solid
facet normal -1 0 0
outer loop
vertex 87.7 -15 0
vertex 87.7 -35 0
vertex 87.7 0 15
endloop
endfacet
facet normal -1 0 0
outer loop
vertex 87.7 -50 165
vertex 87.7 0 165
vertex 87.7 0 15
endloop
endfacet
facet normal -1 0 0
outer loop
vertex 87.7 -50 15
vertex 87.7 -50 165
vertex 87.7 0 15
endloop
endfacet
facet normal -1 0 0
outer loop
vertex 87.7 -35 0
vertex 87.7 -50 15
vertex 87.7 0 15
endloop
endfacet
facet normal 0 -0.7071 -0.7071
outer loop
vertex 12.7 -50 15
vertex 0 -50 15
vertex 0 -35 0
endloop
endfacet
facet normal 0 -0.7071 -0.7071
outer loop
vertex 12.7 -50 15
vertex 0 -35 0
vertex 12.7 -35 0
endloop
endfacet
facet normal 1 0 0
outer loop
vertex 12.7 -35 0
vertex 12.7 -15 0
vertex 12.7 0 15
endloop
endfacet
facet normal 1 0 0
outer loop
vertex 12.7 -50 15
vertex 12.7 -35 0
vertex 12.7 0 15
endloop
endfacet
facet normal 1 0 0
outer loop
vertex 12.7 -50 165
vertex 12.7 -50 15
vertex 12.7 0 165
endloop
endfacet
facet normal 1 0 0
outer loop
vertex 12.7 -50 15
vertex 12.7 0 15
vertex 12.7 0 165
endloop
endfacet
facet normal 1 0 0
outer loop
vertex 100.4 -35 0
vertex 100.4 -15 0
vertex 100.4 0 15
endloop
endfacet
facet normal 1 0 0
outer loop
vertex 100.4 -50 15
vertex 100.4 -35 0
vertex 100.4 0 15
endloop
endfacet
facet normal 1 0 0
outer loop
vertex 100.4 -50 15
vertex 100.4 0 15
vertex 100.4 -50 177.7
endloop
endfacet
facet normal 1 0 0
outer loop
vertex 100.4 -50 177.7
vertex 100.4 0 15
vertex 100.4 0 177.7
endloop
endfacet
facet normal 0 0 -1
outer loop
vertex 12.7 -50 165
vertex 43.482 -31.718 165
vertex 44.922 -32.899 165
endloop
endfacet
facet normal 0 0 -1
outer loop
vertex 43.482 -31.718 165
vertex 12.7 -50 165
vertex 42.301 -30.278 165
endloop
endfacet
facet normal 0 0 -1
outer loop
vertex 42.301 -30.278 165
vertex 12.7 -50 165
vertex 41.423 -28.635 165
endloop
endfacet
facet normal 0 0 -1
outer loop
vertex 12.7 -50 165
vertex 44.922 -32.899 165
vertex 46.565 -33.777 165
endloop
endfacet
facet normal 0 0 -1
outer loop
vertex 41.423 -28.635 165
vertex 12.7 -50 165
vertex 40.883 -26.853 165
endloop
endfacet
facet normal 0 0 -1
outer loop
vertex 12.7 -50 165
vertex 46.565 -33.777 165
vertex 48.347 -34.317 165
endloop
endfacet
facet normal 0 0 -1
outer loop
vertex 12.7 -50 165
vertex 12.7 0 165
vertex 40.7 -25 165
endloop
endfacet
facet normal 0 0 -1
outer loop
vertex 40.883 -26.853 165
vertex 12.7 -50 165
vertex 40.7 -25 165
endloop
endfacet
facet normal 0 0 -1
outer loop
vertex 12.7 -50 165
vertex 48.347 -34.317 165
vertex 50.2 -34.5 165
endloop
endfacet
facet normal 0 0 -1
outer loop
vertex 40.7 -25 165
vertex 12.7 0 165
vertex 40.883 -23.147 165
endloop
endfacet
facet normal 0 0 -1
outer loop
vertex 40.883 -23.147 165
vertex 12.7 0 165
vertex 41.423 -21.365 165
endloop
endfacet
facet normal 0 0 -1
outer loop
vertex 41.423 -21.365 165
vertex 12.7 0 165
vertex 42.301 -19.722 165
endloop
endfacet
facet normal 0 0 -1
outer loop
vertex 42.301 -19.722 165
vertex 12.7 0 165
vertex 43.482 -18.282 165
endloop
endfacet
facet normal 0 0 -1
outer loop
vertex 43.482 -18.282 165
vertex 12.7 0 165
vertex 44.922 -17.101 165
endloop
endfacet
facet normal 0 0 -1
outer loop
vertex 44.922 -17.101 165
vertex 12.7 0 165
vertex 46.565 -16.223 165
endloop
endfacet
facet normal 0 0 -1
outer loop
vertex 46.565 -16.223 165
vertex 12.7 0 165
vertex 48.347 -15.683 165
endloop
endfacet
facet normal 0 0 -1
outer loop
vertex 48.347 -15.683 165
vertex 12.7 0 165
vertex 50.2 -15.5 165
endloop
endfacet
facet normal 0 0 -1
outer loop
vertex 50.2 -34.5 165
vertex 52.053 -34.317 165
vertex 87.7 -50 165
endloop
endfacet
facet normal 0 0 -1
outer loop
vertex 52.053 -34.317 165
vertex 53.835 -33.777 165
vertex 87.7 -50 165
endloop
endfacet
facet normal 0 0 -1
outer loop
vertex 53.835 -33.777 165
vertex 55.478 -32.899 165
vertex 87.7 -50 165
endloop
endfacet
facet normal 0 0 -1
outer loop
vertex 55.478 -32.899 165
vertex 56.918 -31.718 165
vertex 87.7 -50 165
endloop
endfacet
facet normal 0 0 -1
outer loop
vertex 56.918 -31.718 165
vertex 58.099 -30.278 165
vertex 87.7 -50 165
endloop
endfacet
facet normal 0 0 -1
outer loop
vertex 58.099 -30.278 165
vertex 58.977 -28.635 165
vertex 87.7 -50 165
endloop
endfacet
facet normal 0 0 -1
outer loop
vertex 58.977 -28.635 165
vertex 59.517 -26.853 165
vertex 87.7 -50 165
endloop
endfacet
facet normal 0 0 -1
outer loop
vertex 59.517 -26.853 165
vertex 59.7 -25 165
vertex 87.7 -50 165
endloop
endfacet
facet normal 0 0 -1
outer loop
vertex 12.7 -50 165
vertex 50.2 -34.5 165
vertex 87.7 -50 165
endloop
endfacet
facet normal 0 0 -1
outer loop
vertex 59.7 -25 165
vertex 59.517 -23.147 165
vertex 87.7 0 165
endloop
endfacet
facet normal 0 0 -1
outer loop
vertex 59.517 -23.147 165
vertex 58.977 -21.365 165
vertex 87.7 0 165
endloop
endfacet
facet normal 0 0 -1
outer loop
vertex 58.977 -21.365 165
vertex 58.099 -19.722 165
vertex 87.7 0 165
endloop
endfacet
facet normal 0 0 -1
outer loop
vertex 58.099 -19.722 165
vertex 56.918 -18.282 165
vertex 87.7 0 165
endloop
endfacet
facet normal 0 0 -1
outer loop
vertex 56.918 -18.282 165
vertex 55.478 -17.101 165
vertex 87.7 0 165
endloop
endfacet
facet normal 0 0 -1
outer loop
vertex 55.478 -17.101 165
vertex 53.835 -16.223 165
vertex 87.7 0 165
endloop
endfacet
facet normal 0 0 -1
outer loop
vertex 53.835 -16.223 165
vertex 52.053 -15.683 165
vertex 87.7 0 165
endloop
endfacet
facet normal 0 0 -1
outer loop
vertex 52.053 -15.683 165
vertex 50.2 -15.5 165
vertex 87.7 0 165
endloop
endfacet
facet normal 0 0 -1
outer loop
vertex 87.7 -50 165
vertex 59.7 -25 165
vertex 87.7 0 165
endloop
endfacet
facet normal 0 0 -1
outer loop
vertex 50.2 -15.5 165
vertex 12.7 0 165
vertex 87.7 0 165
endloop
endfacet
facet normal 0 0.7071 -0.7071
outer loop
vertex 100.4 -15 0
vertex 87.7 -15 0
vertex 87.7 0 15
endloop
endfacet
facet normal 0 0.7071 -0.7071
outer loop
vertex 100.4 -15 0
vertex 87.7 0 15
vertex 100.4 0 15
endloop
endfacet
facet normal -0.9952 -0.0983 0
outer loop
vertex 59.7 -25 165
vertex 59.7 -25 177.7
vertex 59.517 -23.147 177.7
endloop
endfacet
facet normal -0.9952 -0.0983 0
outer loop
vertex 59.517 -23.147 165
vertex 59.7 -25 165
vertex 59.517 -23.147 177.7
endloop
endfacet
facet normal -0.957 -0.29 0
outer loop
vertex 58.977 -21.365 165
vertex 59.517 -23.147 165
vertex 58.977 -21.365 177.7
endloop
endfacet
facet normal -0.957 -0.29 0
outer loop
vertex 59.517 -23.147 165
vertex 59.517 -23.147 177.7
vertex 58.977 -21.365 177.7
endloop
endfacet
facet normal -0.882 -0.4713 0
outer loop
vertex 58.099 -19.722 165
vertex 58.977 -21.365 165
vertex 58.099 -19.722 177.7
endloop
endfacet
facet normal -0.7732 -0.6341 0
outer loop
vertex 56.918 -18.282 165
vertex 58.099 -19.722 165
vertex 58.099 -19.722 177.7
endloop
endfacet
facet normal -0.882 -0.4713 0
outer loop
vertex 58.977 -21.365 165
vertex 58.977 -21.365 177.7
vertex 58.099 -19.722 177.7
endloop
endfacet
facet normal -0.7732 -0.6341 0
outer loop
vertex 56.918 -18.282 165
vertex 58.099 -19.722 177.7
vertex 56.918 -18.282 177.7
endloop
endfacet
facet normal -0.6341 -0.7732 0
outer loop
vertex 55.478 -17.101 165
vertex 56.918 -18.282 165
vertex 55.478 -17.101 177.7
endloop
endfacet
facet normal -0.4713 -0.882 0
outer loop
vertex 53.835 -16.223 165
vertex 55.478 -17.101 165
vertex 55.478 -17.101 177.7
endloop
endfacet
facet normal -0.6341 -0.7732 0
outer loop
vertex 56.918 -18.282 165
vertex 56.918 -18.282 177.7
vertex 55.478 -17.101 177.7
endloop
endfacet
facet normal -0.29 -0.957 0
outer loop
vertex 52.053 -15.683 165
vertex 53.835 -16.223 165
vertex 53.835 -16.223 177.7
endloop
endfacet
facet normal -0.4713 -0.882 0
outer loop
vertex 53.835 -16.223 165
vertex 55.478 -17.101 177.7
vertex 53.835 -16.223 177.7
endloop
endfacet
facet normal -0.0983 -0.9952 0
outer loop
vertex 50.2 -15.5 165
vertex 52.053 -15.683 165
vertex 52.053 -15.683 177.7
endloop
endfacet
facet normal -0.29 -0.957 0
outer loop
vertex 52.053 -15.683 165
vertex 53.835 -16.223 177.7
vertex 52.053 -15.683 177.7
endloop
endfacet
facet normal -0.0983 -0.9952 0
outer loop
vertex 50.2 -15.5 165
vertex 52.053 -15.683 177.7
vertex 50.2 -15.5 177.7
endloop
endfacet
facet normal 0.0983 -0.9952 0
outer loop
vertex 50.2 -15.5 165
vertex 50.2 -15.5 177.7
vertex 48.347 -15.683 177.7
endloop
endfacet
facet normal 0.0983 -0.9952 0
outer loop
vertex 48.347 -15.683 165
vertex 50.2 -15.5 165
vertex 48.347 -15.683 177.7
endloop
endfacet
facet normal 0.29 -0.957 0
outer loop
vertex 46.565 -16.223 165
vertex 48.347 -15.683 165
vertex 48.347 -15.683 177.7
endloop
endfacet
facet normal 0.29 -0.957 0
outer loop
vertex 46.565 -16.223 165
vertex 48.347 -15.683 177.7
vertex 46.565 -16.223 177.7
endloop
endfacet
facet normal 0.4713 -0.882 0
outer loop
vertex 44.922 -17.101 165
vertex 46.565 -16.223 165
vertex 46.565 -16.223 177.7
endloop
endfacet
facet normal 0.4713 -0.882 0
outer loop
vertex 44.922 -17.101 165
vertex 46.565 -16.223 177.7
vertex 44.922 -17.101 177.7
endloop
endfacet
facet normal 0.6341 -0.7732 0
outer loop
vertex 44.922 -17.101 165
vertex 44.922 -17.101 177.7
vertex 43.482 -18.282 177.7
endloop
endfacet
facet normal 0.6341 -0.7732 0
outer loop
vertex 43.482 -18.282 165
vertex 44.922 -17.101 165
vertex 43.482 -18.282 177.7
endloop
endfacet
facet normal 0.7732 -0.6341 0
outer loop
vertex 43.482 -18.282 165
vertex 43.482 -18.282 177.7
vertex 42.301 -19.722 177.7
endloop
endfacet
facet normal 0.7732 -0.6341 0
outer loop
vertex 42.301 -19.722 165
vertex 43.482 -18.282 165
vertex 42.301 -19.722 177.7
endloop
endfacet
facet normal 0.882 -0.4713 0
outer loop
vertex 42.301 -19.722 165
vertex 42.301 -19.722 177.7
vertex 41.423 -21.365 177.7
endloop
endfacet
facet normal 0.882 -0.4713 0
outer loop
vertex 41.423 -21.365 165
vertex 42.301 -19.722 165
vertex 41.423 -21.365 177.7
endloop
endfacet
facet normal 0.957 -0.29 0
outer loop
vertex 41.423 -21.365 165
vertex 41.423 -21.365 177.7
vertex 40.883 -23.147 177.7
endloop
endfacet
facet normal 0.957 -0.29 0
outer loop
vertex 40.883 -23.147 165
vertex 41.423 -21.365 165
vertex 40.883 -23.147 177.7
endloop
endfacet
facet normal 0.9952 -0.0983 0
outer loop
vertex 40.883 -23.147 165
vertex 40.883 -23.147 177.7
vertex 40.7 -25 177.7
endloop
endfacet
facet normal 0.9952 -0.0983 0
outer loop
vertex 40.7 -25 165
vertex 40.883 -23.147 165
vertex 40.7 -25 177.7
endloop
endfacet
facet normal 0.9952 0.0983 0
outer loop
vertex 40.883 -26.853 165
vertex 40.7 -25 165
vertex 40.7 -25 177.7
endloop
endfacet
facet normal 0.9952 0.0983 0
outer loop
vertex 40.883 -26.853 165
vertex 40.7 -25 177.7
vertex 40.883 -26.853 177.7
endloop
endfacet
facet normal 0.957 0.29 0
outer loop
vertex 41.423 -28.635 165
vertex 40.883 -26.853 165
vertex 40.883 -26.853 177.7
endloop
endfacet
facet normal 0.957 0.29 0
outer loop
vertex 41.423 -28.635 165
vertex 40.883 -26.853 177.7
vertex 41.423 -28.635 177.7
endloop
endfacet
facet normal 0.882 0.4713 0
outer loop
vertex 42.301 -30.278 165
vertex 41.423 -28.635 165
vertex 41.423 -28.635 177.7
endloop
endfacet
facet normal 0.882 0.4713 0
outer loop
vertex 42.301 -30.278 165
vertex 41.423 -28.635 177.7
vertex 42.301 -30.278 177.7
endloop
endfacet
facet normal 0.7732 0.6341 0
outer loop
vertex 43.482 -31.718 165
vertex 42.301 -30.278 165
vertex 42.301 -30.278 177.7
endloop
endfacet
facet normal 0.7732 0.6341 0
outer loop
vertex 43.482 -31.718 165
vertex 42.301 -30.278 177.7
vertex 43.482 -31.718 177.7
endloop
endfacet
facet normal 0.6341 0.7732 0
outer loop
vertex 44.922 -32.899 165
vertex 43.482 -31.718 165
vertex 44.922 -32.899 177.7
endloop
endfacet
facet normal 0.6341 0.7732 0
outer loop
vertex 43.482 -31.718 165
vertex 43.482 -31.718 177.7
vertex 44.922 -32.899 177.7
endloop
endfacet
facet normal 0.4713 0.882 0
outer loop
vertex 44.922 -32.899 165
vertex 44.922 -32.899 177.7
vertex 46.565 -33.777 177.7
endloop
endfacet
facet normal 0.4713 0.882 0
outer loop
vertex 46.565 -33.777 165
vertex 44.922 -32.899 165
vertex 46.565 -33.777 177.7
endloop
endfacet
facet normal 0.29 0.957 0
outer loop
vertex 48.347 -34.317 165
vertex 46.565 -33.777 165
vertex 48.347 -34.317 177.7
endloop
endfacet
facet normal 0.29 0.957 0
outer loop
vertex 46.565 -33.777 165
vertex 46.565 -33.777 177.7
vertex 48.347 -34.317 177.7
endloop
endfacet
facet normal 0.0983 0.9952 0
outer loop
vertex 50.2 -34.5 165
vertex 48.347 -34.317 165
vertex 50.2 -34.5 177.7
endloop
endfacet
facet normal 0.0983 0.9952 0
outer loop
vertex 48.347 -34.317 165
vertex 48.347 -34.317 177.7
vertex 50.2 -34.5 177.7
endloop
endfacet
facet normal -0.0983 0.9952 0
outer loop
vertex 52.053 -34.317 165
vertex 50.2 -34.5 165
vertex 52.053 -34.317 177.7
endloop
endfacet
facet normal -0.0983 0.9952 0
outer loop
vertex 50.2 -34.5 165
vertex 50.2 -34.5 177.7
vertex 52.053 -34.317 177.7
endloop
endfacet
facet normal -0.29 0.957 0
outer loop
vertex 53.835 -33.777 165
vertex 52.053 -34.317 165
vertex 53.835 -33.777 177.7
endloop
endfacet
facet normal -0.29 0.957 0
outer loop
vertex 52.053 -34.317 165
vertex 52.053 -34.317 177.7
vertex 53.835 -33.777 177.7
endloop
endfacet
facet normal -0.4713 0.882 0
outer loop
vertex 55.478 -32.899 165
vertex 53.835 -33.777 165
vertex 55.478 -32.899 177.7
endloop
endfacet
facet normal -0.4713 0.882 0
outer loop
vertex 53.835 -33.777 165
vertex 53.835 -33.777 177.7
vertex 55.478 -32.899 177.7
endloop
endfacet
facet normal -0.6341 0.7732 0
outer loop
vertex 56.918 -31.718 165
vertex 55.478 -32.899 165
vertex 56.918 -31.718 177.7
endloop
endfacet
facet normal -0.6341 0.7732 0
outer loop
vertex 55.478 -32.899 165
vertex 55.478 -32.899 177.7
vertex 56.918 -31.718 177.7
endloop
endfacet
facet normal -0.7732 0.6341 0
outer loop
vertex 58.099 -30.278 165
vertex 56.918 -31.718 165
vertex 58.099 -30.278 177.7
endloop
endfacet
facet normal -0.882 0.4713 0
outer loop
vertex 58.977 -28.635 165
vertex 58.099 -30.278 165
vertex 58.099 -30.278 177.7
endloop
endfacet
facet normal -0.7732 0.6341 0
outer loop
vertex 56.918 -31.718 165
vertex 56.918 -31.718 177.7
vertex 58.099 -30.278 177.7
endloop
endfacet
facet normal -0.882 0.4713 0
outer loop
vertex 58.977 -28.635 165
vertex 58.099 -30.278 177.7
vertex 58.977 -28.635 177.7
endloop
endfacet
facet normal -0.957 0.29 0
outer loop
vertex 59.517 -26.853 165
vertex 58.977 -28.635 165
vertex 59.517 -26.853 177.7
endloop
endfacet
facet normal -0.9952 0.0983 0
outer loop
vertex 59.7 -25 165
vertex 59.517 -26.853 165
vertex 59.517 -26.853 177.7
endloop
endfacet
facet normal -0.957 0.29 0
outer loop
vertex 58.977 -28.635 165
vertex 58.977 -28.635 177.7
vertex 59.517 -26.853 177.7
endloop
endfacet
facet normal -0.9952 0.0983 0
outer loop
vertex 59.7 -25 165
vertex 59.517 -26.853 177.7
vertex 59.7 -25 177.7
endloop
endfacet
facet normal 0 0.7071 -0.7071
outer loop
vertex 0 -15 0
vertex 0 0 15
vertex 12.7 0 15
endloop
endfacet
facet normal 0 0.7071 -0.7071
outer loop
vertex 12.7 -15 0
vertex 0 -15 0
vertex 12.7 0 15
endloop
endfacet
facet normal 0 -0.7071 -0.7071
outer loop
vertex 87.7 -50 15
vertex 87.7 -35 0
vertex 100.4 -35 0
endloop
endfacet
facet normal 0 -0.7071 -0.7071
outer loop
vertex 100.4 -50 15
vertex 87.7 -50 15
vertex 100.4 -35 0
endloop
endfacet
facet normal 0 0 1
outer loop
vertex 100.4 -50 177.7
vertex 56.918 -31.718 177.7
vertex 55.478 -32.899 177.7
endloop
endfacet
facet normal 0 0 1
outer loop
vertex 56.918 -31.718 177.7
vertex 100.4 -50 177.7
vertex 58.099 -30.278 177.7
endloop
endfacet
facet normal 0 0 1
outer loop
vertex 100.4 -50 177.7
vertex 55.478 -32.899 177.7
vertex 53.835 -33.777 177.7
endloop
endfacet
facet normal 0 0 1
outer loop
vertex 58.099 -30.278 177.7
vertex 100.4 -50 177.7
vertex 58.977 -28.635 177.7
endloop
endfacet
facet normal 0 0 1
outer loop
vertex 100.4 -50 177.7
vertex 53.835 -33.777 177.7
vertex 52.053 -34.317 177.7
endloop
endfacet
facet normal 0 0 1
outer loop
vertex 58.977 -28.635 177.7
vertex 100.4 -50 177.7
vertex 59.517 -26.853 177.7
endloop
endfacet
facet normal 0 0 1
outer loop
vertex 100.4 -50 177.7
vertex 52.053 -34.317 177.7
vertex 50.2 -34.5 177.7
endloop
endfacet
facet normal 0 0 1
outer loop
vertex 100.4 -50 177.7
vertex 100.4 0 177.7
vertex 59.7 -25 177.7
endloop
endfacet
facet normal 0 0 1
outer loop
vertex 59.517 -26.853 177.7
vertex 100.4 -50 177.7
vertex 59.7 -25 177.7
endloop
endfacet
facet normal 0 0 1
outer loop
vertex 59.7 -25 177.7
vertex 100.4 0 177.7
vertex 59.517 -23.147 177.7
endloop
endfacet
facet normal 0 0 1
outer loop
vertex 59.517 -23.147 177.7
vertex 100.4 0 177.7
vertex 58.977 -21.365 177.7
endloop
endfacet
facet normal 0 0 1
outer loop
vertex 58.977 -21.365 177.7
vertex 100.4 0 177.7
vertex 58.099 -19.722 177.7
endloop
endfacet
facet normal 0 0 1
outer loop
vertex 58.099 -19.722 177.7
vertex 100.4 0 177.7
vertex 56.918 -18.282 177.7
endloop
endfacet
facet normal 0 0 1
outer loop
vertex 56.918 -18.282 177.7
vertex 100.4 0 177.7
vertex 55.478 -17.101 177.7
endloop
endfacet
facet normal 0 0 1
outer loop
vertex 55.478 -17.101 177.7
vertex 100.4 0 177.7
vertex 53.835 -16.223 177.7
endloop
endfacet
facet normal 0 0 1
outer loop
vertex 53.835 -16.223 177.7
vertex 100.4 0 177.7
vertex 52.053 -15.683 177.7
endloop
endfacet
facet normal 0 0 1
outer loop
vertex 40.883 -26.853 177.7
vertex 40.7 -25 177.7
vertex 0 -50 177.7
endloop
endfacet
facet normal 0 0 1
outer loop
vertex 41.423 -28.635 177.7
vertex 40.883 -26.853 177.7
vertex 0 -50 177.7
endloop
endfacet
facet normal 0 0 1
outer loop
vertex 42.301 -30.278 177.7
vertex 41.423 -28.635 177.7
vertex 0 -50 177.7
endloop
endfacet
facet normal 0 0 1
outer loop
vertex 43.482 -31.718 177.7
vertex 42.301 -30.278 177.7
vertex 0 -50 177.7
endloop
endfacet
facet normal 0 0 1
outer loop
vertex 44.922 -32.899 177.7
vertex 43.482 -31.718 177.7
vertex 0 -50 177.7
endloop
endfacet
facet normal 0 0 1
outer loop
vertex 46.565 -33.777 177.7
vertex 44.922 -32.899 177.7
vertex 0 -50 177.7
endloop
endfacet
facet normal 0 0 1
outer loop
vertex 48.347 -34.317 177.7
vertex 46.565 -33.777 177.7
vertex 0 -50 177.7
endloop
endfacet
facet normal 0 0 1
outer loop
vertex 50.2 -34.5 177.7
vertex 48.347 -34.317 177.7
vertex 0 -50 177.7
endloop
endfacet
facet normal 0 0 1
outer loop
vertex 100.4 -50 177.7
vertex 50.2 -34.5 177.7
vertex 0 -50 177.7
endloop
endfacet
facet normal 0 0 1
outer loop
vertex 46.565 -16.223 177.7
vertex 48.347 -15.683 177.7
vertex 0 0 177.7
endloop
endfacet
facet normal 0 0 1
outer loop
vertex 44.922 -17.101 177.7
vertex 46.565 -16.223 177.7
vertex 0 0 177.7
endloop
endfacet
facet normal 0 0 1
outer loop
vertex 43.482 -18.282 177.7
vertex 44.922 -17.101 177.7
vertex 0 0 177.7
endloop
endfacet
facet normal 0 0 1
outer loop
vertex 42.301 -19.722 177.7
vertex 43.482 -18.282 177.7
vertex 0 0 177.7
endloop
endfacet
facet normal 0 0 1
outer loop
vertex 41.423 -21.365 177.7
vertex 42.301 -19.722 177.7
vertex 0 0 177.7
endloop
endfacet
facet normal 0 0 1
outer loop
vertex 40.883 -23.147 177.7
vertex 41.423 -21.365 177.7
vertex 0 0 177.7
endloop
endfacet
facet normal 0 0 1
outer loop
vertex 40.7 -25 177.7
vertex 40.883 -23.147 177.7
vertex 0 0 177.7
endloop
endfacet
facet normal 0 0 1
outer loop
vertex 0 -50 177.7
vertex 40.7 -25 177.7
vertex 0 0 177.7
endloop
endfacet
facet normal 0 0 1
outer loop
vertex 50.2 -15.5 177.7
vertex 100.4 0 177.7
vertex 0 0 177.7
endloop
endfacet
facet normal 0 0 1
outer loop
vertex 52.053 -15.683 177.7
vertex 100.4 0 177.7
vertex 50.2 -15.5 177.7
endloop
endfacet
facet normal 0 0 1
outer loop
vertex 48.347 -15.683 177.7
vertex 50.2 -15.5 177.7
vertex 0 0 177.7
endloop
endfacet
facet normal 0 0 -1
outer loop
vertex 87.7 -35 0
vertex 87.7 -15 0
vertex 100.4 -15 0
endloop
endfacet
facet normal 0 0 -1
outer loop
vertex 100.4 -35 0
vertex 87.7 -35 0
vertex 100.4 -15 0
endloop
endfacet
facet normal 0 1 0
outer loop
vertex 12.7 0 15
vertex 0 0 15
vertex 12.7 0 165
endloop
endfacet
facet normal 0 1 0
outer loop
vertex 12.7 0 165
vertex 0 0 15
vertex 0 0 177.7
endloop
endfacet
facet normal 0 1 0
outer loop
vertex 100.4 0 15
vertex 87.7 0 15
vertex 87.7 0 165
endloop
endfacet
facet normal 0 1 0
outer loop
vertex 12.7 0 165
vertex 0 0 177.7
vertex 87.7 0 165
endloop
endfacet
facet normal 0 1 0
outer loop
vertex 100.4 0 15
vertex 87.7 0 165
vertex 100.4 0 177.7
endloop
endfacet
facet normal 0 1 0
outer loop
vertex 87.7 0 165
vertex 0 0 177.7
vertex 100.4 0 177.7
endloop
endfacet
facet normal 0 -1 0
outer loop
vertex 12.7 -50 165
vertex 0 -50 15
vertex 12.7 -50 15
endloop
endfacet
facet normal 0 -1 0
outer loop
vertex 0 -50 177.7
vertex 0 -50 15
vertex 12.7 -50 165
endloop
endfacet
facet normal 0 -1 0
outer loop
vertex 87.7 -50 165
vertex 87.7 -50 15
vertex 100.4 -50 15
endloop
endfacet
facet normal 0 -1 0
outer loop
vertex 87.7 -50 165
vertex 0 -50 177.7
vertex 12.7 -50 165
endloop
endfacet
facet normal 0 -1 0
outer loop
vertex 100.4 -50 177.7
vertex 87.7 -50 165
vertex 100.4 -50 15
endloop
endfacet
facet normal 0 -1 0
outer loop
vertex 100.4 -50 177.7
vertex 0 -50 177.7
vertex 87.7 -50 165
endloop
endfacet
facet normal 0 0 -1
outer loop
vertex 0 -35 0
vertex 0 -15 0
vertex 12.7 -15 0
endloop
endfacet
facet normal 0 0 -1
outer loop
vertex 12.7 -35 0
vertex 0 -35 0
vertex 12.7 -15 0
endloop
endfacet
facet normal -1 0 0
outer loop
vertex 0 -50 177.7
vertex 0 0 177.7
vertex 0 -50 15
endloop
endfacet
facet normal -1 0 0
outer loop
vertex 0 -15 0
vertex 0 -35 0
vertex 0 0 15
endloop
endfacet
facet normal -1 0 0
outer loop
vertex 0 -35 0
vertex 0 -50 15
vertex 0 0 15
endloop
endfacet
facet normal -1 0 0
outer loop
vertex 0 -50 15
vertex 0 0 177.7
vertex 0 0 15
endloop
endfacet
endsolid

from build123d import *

# Parameters (mm, degrees)
F1_DEPTH = 50
F2_R     = 9.5
F3_DEPTH = 177.701
F5_SIZE  = 15
F6_SIZE  = 15


with BuildPart() as f1:
    # F0 (on Front) → F1 (new body)
    with BuildSketch(Plane.XZ):
        Polygon((0, 177.7), (0, 0), (12.7, 0), (12.7, 165), (87.7, 165), (87.7, 0), (100.4, 0), (100.4, 177.7), align=None)
    extrude(amount=F1_DEPTH)

    # F2 (on face) → F3 (cut, through all)
    with BuildSketch(Plane.XY.offset(177.7)):
        with Locations((50.2, -25)):
            Circle(F2_R)
    extrude(amount=-F3_DEPTH, mode=Mode.SUBTRACT)

    # F5
    f5_edges = [f1.edges().sort_by_distance(p)[0] for p in [
        (6.35, -50, 0),
        (6.35, 0, 0),
    ]]
    chamfer(f5_edges, length=F5_SIZE)

    # F6
    f6_edges = [f1.edges().sort_by_distance(p)[0] for p in [
        (94.05, -50, 0),
        (94.05, 0, 0),
    ]]
    chamfer(f6_edges, length=F6_SIZE)


solid = f1.part
